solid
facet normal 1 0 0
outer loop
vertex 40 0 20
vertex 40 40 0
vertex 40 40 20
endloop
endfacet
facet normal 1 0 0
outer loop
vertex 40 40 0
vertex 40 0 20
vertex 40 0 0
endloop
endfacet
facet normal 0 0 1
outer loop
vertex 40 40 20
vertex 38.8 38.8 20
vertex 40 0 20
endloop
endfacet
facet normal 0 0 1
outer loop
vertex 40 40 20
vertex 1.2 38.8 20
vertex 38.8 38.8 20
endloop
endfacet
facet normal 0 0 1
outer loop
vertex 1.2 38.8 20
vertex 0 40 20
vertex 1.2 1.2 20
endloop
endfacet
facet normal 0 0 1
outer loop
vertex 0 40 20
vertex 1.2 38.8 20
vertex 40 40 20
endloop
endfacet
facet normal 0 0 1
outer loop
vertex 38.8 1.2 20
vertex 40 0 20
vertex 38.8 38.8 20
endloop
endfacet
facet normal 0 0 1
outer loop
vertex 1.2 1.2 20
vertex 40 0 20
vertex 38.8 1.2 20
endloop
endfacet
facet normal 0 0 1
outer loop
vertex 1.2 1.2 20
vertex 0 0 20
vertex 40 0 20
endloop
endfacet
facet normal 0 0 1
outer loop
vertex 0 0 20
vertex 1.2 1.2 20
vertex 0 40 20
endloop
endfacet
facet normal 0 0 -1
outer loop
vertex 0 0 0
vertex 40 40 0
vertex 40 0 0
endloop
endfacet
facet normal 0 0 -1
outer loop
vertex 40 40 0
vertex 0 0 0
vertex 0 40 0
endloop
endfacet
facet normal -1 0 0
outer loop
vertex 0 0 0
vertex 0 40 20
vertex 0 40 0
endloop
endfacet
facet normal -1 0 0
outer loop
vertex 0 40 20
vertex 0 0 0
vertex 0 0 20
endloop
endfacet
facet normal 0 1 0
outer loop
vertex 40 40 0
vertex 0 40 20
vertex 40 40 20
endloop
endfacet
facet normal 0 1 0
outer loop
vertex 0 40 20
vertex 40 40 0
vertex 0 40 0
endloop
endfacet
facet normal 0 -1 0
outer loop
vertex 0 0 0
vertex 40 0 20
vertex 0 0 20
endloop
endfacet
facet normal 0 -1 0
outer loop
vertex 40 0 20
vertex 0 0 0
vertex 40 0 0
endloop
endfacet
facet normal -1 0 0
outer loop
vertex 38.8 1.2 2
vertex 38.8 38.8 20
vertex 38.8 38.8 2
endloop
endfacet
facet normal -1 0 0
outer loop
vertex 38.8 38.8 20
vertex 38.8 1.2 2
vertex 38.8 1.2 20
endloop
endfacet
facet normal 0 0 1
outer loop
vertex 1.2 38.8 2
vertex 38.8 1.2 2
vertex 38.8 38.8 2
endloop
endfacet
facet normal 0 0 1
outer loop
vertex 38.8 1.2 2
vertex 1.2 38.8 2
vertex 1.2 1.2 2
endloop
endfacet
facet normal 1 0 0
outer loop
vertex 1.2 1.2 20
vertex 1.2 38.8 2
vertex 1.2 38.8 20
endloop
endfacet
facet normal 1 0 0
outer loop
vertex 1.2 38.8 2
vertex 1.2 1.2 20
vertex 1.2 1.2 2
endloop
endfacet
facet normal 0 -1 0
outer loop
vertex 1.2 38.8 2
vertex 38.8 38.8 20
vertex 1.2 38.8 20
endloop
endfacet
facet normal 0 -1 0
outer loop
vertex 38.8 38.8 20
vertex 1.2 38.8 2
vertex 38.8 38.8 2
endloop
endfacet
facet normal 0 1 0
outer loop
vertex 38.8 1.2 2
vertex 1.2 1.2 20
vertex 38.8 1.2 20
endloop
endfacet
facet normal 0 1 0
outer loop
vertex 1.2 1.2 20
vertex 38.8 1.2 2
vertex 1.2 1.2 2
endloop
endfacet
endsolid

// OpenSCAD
$fn = 32;

// ----------------------------------------------------------------------
// Open box: 1.2 mm walls
// ----------------------------------------------------------------------

// --- parameters (mm) ---
box_l = 40;               // outer length, X
box_w = 40;               // outer width, Y
box_h = 20;               // outer height, Z
wall = 1.2;               // wall thickness
floor = 2;                // floor thickness

difference() {
  cube([box_l, box_w, box_h]);
  translate([wall, wall, floor])
    cube([box_l - 2 * wall, box_w - 2 * wall, box_h]);
}
